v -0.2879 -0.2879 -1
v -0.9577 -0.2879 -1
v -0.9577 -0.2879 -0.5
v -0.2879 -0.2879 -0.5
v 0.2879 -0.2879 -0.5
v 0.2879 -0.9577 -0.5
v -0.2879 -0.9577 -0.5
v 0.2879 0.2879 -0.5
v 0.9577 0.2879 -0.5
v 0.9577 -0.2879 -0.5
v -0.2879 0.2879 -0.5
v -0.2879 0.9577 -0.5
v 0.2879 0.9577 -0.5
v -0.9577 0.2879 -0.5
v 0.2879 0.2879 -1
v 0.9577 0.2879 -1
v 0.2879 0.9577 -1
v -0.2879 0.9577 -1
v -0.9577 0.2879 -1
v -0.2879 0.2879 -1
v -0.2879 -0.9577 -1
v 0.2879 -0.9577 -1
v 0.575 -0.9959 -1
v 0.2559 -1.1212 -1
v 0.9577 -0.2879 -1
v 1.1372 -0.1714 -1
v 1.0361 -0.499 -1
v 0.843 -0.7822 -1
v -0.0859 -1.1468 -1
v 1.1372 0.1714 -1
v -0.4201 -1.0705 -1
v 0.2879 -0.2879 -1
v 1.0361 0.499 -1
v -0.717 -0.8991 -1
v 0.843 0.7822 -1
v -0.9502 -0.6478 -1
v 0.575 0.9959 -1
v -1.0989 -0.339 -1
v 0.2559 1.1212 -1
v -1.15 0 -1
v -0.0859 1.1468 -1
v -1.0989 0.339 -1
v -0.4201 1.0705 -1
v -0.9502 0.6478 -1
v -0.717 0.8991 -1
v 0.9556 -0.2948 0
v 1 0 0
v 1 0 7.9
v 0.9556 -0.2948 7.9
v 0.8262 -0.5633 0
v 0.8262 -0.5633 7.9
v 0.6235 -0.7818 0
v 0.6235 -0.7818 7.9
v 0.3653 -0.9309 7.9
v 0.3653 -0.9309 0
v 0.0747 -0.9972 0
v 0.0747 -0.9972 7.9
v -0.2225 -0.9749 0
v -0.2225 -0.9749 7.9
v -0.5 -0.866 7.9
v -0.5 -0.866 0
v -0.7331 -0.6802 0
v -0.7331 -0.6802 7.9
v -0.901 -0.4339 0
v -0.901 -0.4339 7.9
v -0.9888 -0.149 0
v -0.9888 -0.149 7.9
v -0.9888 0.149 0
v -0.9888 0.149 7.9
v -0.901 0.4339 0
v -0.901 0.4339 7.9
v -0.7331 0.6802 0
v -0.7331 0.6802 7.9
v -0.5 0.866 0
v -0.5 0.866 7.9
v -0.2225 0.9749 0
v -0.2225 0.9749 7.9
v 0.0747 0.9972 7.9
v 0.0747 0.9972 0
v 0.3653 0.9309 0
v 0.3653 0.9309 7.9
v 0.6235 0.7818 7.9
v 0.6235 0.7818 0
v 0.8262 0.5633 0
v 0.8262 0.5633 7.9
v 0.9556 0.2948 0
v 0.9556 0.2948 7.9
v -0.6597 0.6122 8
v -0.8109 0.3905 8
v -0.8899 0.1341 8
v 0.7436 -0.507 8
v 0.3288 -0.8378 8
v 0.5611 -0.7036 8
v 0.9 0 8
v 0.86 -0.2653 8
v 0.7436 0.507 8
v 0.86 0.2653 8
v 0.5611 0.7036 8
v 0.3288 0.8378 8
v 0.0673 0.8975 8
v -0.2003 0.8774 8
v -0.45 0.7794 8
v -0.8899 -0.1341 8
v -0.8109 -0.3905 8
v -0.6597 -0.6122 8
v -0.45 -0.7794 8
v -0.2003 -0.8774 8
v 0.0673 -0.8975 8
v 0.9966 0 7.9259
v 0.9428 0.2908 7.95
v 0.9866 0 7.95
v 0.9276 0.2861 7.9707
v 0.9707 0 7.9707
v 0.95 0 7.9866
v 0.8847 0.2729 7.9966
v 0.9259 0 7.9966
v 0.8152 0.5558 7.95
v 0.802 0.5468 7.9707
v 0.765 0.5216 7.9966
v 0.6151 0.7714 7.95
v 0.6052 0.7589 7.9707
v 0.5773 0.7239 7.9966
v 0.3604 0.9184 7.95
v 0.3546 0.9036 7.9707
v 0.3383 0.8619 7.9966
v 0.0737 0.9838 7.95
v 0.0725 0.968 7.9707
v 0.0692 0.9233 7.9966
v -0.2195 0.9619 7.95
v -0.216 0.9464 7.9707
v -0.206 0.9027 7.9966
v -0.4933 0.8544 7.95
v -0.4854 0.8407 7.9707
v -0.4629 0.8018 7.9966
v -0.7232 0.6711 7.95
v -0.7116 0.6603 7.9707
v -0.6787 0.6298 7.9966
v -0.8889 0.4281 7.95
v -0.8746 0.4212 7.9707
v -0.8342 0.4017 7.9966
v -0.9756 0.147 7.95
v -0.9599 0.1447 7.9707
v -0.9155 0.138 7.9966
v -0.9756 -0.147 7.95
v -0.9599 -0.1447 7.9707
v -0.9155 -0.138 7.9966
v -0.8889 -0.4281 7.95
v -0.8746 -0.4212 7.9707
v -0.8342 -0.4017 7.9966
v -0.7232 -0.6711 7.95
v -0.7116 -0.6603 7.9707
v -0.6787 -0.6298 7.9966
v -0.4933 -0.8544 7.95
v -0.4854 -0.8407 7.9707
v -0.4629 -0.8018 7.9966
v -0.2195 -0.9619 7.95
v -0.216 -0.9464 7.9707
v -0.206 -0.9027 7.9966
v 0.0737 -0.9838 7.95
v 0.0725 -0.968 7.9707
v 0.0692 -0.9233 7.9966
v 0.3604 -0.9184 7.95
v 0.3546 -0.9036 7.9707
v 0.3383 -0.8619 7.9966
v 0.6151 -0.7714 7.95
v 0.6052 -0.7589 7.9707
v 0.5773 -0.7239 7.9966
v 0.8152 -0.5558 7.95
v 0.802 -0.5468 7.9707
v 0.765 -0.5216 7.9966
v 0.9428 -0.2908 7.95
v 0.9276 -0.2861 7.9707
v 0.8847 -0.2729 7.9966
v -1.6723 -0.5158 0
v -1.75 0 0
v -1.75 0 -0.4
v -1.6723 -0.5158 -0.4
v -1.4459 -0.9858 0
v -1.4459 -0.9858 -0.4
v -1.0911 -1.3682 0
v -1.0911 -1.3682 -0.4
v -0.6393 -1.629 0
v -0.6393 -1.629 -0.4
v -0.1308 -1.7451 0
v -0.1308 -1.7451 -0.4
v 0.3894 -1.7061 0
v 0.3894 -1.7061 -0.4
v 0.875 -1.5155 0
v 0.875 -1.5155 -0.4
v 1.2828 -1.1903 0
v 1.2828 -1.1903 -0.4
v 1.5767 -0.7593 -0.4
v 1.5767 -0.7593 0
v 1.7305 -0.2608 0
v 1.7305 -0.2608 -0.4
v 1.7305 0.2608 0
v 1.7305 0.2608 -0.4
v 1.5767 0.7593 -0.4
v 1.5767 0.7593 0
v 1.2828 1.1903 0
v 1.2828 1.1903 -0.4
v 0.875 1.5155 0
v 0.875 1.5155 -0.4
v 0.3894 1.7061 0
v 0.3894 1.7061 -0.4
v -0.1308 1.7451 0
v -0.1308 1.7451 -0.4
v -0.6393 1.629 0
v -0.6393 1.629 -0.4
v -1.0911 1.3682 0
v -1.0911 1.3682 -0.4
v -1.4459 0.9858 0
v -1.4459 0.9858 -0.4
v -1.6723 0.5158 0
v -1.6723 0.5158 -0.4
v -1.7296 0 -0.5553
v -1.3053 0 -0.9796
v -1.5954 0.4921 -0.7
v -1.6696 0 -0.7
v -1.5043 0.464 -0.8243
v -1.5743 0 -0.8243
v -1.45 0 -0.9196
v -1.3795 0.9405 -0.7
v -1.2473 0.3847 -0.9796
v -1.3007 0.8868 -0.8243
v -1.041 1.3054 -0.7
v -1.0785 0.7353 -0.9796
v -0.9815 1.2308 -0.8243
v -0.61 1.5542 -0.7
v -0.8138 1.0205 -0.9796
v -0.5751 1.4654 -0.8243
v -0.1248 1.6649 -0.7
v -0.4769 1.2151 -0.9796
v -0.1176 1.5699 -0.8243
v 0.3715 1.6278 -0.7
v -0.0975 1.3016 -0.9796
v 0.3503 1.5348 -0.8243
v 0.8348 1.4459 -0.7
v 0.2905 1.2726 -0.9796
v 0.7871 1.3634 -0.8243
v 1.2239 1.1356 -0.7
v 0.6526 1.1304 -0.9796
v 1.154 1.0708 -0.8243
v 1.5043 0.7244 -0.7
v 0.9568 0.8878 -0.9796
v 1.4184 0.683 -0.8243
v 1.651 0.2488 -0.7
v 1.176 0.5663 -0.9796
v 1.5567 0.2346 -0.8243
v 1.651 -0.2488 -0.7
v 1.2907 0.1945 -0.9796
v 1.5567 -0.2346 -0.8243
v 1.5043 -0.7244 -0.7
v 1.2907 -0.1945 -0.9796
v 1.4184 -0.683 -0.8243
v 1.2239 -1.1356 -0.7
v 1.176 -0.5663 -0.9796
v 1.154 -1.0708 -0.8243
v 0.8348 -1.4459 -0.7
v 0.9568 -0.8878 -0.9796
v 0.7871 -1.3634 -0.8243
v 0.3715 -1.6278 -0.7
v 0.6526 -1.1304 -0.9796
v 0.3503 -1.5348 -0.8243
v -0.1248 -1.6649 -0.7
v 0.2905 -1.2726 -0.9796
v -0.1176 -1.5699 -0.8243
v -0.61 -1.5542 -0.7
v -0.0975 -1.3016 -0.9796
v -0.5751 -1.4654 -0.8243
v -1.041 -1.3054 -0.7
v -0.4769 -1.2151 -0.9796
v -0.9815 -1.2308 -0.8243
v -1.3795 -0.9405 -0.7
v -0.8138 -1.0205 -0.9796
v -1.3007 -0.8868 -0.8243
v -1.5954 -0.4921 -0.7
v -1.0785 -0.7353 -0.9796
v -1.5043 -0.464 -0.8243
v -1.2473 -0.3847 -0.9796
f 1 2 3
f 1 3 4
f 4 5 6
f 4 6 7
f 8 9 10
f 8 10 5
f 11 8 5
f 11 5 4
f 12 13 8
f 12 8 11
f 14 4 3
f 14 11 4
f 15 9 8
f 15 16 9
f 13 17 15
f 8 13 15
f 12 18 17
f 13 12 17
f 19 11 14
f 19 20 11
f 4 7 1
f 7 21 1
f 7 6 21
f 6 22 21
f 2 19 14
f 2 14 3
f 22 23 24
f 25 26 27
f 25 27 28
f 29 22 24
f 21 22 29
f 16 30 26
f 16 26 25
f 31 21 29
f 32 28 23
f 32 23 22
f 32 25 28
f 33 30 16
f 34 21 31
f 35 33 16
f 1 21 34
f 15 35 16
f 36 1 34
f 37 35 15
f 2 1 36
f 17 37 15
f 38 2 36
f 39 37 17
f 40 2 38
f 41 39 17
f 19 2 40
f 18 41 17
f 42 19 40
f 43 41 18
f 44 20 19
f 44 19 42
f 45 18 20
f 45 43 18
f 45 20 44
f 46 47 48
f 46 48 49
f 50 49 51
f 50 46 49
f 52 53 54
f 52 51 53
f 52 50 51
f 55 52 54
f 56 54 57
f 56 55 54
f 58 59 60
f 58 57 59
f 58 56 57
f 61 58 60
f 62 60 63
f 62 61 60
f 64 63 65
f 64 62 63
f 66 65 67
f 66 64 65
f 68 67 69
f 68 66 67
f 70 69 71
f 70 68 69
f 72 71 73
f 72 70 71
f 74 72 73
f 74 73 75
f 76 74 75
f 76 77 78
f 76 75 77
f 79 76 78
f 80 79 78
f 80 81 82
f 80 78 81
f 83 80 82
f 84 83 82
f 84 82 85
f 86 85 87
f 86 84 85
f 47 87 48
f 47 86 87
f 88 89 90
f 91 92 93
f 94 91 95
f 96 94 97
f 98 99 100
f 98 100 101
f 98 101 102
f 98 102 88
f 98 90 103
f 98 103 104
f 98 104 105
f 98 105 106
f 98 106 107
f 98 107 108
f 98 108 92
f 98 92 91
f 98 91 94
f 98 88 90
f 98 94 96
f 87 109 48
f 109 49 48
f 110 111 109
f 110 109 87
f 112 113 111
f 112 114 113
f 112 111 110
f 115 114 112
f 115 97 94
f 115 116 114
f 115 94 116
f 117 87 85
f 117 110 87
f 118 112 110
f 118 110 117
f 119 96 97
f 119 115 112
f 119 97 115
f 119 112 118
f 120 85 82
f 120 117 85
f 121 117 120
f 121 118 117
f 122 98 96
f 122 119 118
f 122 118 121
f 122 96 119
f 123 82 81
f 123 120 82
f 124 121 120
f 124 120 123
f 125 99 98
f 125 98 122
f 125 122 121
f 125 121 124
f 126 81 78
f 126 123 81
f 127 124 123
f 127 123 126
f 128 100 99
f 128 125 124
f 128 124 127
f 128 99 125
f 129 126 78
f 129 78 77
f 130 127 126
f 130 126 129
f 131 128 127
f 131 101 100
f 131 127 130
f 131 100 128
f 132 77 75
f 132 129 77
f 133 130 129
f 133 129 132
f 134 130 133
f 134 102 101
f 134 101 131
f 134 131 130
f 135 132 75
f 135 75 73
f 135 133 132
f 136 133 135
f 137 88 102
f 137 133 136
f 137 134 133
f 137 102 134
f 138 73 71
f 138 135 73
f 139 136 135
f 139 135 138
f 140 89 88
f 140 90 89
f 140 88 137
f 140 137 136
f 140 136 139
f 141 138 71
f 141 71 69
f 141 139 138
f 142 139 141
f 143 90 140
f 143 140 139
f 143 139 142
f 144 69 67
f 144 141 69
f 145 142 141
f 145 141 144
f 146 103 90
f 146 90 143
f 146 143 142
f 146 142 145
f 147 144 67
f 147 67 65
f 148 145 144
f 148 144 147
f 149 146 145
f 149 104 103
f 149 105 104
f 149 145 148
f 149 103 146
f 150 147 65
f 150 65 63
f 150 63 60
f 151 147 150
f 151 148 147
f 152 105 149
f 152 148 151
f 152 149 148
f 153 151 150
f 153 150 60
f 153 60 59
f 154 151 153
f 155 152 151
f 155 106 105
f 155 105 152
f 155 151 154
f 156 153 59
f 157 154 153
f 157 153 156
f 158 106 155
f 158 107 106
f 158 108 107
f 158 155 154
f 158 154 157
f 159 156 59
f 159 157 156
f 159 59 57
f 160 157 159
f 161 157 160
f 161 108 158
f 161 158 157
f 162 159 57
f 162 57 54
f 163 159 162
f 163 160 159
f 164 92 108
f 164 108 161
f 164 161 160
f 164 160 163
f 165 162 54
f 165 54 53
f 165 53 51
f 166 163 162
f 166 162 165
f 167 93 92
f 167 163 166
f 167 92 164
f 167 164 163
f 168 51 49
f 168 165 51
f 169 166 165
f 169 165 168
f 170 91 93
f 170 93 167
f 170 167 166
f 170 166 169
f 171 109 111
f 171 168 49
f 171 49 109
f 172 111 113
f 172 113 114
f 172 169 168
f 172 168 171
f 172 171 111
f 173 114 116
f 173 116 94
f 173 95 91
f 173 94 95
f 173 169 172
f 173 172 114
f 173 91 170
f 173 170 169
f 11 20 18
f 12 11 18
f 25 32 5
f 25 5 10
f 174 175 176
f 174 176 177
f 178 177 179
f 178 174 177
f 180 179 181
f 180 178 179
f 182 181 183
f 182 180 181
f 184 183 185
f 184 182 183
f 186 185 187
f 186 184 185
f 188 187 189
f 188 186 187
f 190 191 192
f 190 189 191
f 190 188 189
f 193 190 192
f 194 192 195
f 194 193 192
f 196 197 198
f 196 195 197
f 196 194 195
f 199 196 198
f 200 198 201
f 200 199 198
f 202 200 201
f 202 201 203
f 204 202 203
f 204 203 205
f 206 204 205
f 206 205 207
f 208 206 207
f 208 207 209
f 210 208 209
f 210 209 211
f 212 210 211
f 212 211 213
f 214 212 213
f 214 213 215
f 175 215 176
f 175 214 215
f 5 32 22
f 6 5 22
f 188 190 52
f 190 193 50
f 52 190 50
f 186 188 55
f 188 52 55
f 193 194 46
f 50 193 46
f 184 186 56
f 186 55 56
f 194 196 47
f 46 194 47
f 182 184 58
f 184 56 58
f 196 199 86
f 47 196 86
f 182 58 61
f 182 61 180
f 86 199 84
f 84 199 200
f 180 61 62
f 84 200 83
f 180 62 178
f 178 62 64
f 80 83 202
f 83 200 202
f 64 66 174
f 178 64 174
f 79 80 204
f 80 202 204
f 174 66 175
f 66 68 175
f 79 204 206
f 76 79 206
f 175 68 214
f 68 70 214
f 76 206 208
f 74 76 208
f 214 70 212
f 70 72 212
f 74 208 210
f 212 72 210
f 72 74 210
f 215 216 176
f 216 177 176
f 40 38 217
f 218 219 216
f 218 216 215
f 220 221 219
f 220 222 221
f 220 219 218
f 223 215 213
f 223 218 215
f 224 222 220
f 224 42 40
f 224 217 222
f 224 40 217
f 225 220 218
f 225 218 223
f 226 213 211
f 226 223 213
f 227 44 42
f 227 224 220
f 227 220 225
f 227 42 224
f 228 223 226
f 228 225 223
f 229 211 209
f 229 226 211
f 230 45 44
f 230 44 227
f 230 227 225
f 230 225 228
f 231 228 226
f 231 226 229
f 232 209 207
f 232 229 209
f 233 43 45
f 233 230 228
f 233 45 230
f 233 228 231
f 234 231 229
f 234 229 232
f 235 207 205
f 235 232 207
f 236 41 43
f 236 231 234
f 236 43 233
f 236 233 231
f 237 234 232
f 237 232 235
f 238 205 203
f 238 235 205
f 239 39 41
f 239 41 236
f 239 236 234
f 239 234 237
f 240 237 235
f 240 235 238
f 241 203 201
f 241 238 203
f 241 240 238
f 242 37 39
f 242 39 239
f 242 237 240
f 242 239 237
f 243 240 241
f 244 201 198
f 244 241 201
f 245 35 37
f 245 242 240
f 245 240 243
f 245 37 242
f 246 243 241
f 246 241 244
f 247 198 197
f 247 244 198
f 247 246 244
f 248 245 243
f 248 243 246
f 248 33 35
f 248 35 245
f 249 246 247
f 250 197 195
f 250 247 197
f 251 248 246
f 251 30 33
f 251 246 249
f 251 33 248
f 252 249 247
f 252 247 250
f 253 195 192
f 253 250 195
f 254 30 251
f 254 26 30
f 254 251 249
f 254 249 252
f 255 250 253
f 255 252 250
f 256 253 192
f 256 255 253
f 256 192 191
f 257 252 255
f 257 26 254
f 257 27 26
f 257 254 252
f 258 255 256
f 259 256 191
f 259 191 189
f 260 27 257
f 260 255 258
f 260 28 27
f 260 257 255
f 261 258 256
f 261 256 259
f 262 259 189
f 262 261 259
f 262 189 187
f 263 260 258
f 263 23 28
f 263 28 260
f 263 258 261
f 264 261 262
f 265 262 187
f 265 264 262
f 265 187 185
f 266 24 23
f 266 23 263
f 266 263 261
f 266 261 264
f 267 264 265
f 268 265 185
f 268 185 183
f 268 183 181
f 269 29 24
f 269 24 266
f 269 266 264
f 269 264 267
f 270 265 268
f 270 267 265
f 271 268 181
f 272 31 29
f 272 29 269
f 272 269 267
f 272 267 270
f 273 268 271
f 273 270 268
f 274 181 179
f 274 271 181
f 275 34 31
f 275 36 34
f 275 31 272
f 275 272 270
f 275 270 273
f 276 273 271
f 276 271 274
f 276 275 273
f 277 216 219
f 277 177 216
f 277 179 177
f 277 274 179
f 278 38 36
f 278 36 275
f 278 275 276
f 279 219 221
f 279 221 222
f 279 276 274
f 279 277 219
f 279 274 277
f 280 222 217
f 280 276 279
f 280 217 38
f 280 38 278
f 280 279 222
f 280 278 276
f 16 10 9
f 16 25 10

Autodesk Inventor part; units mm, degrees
ref_plane "YZ Plane" through (0, 0, 0) normal (1, 0, 0) x (0, 1, 0)
ref_plane "XZ Plane" through (0, 0, 0) normal (0, 1, 0) x (-1, 0, 0)
ref_plane "XY Plane" through (0, 0, 0) normal (0, 0, 1) x (1, 0, 0)
sketch "Sketch1" plane through (0, 0, 0) normal (0, 0, 1) x (1, 0, 0)
  circle A0 centre (0, 0) radius 1
  dimension "d0" = 2
extrude "Extrusion1" add sketch "Sketch1" along normal blind 8
sketch "Sketch2" plane through (0, 0, 0) normal (0, 0, -1) x (-1, 0, 0)
  circle A0 centre (0, 0) radius 1.75
  dimension "d3" = 3.5
extrude "Extrusion2" add sketch "Sketch2" along normal blind 1
sketch "Sketch3" plane through (0, 0, -1) normal (0, 0, -1) x (-1, 0, 0)
  circle A0 centre (0, 0) radius 1 projected
  line L0 (-0.2879, -0.9577) -> (0.2879, -0.9577)
  line L1 (0.2879, -0.9577) -> (0.2879, 0.9577)
  line L2 (0.2879, 0.9577) -> (-0.2879, 0.9577)
  line L3 (-0.2879, 0.9577) -> (-0.2879, -0.9577)
  line L4 (-0.2879, -0.9577) -> (0.2879, 0.9577) construction
  line L5 (0.2879, -0.9577) -> (-0.2879, 0.9577) construction
  line L6 (-0.9577, 0.2879) -> (0.9577, 0.2879)
  line L7 (0.9577, 0.2879) -> (0.9577, -0.2879)
  line L8 (0.9577, -0.2879) -> (-0.9577, -0.2879)
  line L9 (-0.9577, -0.2879) -> (-0.9577, 0.2879)
  line L10 (-0.9577, 0.2879) -> (0.9577, -0.2879) construction
  line L11 (0.9577, 0.2879) -> (-0.9577, -0.2879) construction
extrude "Extrusion3" cut sketch "Sketch3" against normal blind 0.5 contours L7 L8 L1 L6 | L1 L6 L3 L2 | L1 L8 L3 L6 | L0 L3 L8 L1 | L3 L8 L9 L6
fillet "Fillet1" radius 0.6 1 edges at (1.75, 0, -1)
fillet "Fillet2" radius 0.1 1 edges at (-1, 0, 8)
properties part number "M2"
